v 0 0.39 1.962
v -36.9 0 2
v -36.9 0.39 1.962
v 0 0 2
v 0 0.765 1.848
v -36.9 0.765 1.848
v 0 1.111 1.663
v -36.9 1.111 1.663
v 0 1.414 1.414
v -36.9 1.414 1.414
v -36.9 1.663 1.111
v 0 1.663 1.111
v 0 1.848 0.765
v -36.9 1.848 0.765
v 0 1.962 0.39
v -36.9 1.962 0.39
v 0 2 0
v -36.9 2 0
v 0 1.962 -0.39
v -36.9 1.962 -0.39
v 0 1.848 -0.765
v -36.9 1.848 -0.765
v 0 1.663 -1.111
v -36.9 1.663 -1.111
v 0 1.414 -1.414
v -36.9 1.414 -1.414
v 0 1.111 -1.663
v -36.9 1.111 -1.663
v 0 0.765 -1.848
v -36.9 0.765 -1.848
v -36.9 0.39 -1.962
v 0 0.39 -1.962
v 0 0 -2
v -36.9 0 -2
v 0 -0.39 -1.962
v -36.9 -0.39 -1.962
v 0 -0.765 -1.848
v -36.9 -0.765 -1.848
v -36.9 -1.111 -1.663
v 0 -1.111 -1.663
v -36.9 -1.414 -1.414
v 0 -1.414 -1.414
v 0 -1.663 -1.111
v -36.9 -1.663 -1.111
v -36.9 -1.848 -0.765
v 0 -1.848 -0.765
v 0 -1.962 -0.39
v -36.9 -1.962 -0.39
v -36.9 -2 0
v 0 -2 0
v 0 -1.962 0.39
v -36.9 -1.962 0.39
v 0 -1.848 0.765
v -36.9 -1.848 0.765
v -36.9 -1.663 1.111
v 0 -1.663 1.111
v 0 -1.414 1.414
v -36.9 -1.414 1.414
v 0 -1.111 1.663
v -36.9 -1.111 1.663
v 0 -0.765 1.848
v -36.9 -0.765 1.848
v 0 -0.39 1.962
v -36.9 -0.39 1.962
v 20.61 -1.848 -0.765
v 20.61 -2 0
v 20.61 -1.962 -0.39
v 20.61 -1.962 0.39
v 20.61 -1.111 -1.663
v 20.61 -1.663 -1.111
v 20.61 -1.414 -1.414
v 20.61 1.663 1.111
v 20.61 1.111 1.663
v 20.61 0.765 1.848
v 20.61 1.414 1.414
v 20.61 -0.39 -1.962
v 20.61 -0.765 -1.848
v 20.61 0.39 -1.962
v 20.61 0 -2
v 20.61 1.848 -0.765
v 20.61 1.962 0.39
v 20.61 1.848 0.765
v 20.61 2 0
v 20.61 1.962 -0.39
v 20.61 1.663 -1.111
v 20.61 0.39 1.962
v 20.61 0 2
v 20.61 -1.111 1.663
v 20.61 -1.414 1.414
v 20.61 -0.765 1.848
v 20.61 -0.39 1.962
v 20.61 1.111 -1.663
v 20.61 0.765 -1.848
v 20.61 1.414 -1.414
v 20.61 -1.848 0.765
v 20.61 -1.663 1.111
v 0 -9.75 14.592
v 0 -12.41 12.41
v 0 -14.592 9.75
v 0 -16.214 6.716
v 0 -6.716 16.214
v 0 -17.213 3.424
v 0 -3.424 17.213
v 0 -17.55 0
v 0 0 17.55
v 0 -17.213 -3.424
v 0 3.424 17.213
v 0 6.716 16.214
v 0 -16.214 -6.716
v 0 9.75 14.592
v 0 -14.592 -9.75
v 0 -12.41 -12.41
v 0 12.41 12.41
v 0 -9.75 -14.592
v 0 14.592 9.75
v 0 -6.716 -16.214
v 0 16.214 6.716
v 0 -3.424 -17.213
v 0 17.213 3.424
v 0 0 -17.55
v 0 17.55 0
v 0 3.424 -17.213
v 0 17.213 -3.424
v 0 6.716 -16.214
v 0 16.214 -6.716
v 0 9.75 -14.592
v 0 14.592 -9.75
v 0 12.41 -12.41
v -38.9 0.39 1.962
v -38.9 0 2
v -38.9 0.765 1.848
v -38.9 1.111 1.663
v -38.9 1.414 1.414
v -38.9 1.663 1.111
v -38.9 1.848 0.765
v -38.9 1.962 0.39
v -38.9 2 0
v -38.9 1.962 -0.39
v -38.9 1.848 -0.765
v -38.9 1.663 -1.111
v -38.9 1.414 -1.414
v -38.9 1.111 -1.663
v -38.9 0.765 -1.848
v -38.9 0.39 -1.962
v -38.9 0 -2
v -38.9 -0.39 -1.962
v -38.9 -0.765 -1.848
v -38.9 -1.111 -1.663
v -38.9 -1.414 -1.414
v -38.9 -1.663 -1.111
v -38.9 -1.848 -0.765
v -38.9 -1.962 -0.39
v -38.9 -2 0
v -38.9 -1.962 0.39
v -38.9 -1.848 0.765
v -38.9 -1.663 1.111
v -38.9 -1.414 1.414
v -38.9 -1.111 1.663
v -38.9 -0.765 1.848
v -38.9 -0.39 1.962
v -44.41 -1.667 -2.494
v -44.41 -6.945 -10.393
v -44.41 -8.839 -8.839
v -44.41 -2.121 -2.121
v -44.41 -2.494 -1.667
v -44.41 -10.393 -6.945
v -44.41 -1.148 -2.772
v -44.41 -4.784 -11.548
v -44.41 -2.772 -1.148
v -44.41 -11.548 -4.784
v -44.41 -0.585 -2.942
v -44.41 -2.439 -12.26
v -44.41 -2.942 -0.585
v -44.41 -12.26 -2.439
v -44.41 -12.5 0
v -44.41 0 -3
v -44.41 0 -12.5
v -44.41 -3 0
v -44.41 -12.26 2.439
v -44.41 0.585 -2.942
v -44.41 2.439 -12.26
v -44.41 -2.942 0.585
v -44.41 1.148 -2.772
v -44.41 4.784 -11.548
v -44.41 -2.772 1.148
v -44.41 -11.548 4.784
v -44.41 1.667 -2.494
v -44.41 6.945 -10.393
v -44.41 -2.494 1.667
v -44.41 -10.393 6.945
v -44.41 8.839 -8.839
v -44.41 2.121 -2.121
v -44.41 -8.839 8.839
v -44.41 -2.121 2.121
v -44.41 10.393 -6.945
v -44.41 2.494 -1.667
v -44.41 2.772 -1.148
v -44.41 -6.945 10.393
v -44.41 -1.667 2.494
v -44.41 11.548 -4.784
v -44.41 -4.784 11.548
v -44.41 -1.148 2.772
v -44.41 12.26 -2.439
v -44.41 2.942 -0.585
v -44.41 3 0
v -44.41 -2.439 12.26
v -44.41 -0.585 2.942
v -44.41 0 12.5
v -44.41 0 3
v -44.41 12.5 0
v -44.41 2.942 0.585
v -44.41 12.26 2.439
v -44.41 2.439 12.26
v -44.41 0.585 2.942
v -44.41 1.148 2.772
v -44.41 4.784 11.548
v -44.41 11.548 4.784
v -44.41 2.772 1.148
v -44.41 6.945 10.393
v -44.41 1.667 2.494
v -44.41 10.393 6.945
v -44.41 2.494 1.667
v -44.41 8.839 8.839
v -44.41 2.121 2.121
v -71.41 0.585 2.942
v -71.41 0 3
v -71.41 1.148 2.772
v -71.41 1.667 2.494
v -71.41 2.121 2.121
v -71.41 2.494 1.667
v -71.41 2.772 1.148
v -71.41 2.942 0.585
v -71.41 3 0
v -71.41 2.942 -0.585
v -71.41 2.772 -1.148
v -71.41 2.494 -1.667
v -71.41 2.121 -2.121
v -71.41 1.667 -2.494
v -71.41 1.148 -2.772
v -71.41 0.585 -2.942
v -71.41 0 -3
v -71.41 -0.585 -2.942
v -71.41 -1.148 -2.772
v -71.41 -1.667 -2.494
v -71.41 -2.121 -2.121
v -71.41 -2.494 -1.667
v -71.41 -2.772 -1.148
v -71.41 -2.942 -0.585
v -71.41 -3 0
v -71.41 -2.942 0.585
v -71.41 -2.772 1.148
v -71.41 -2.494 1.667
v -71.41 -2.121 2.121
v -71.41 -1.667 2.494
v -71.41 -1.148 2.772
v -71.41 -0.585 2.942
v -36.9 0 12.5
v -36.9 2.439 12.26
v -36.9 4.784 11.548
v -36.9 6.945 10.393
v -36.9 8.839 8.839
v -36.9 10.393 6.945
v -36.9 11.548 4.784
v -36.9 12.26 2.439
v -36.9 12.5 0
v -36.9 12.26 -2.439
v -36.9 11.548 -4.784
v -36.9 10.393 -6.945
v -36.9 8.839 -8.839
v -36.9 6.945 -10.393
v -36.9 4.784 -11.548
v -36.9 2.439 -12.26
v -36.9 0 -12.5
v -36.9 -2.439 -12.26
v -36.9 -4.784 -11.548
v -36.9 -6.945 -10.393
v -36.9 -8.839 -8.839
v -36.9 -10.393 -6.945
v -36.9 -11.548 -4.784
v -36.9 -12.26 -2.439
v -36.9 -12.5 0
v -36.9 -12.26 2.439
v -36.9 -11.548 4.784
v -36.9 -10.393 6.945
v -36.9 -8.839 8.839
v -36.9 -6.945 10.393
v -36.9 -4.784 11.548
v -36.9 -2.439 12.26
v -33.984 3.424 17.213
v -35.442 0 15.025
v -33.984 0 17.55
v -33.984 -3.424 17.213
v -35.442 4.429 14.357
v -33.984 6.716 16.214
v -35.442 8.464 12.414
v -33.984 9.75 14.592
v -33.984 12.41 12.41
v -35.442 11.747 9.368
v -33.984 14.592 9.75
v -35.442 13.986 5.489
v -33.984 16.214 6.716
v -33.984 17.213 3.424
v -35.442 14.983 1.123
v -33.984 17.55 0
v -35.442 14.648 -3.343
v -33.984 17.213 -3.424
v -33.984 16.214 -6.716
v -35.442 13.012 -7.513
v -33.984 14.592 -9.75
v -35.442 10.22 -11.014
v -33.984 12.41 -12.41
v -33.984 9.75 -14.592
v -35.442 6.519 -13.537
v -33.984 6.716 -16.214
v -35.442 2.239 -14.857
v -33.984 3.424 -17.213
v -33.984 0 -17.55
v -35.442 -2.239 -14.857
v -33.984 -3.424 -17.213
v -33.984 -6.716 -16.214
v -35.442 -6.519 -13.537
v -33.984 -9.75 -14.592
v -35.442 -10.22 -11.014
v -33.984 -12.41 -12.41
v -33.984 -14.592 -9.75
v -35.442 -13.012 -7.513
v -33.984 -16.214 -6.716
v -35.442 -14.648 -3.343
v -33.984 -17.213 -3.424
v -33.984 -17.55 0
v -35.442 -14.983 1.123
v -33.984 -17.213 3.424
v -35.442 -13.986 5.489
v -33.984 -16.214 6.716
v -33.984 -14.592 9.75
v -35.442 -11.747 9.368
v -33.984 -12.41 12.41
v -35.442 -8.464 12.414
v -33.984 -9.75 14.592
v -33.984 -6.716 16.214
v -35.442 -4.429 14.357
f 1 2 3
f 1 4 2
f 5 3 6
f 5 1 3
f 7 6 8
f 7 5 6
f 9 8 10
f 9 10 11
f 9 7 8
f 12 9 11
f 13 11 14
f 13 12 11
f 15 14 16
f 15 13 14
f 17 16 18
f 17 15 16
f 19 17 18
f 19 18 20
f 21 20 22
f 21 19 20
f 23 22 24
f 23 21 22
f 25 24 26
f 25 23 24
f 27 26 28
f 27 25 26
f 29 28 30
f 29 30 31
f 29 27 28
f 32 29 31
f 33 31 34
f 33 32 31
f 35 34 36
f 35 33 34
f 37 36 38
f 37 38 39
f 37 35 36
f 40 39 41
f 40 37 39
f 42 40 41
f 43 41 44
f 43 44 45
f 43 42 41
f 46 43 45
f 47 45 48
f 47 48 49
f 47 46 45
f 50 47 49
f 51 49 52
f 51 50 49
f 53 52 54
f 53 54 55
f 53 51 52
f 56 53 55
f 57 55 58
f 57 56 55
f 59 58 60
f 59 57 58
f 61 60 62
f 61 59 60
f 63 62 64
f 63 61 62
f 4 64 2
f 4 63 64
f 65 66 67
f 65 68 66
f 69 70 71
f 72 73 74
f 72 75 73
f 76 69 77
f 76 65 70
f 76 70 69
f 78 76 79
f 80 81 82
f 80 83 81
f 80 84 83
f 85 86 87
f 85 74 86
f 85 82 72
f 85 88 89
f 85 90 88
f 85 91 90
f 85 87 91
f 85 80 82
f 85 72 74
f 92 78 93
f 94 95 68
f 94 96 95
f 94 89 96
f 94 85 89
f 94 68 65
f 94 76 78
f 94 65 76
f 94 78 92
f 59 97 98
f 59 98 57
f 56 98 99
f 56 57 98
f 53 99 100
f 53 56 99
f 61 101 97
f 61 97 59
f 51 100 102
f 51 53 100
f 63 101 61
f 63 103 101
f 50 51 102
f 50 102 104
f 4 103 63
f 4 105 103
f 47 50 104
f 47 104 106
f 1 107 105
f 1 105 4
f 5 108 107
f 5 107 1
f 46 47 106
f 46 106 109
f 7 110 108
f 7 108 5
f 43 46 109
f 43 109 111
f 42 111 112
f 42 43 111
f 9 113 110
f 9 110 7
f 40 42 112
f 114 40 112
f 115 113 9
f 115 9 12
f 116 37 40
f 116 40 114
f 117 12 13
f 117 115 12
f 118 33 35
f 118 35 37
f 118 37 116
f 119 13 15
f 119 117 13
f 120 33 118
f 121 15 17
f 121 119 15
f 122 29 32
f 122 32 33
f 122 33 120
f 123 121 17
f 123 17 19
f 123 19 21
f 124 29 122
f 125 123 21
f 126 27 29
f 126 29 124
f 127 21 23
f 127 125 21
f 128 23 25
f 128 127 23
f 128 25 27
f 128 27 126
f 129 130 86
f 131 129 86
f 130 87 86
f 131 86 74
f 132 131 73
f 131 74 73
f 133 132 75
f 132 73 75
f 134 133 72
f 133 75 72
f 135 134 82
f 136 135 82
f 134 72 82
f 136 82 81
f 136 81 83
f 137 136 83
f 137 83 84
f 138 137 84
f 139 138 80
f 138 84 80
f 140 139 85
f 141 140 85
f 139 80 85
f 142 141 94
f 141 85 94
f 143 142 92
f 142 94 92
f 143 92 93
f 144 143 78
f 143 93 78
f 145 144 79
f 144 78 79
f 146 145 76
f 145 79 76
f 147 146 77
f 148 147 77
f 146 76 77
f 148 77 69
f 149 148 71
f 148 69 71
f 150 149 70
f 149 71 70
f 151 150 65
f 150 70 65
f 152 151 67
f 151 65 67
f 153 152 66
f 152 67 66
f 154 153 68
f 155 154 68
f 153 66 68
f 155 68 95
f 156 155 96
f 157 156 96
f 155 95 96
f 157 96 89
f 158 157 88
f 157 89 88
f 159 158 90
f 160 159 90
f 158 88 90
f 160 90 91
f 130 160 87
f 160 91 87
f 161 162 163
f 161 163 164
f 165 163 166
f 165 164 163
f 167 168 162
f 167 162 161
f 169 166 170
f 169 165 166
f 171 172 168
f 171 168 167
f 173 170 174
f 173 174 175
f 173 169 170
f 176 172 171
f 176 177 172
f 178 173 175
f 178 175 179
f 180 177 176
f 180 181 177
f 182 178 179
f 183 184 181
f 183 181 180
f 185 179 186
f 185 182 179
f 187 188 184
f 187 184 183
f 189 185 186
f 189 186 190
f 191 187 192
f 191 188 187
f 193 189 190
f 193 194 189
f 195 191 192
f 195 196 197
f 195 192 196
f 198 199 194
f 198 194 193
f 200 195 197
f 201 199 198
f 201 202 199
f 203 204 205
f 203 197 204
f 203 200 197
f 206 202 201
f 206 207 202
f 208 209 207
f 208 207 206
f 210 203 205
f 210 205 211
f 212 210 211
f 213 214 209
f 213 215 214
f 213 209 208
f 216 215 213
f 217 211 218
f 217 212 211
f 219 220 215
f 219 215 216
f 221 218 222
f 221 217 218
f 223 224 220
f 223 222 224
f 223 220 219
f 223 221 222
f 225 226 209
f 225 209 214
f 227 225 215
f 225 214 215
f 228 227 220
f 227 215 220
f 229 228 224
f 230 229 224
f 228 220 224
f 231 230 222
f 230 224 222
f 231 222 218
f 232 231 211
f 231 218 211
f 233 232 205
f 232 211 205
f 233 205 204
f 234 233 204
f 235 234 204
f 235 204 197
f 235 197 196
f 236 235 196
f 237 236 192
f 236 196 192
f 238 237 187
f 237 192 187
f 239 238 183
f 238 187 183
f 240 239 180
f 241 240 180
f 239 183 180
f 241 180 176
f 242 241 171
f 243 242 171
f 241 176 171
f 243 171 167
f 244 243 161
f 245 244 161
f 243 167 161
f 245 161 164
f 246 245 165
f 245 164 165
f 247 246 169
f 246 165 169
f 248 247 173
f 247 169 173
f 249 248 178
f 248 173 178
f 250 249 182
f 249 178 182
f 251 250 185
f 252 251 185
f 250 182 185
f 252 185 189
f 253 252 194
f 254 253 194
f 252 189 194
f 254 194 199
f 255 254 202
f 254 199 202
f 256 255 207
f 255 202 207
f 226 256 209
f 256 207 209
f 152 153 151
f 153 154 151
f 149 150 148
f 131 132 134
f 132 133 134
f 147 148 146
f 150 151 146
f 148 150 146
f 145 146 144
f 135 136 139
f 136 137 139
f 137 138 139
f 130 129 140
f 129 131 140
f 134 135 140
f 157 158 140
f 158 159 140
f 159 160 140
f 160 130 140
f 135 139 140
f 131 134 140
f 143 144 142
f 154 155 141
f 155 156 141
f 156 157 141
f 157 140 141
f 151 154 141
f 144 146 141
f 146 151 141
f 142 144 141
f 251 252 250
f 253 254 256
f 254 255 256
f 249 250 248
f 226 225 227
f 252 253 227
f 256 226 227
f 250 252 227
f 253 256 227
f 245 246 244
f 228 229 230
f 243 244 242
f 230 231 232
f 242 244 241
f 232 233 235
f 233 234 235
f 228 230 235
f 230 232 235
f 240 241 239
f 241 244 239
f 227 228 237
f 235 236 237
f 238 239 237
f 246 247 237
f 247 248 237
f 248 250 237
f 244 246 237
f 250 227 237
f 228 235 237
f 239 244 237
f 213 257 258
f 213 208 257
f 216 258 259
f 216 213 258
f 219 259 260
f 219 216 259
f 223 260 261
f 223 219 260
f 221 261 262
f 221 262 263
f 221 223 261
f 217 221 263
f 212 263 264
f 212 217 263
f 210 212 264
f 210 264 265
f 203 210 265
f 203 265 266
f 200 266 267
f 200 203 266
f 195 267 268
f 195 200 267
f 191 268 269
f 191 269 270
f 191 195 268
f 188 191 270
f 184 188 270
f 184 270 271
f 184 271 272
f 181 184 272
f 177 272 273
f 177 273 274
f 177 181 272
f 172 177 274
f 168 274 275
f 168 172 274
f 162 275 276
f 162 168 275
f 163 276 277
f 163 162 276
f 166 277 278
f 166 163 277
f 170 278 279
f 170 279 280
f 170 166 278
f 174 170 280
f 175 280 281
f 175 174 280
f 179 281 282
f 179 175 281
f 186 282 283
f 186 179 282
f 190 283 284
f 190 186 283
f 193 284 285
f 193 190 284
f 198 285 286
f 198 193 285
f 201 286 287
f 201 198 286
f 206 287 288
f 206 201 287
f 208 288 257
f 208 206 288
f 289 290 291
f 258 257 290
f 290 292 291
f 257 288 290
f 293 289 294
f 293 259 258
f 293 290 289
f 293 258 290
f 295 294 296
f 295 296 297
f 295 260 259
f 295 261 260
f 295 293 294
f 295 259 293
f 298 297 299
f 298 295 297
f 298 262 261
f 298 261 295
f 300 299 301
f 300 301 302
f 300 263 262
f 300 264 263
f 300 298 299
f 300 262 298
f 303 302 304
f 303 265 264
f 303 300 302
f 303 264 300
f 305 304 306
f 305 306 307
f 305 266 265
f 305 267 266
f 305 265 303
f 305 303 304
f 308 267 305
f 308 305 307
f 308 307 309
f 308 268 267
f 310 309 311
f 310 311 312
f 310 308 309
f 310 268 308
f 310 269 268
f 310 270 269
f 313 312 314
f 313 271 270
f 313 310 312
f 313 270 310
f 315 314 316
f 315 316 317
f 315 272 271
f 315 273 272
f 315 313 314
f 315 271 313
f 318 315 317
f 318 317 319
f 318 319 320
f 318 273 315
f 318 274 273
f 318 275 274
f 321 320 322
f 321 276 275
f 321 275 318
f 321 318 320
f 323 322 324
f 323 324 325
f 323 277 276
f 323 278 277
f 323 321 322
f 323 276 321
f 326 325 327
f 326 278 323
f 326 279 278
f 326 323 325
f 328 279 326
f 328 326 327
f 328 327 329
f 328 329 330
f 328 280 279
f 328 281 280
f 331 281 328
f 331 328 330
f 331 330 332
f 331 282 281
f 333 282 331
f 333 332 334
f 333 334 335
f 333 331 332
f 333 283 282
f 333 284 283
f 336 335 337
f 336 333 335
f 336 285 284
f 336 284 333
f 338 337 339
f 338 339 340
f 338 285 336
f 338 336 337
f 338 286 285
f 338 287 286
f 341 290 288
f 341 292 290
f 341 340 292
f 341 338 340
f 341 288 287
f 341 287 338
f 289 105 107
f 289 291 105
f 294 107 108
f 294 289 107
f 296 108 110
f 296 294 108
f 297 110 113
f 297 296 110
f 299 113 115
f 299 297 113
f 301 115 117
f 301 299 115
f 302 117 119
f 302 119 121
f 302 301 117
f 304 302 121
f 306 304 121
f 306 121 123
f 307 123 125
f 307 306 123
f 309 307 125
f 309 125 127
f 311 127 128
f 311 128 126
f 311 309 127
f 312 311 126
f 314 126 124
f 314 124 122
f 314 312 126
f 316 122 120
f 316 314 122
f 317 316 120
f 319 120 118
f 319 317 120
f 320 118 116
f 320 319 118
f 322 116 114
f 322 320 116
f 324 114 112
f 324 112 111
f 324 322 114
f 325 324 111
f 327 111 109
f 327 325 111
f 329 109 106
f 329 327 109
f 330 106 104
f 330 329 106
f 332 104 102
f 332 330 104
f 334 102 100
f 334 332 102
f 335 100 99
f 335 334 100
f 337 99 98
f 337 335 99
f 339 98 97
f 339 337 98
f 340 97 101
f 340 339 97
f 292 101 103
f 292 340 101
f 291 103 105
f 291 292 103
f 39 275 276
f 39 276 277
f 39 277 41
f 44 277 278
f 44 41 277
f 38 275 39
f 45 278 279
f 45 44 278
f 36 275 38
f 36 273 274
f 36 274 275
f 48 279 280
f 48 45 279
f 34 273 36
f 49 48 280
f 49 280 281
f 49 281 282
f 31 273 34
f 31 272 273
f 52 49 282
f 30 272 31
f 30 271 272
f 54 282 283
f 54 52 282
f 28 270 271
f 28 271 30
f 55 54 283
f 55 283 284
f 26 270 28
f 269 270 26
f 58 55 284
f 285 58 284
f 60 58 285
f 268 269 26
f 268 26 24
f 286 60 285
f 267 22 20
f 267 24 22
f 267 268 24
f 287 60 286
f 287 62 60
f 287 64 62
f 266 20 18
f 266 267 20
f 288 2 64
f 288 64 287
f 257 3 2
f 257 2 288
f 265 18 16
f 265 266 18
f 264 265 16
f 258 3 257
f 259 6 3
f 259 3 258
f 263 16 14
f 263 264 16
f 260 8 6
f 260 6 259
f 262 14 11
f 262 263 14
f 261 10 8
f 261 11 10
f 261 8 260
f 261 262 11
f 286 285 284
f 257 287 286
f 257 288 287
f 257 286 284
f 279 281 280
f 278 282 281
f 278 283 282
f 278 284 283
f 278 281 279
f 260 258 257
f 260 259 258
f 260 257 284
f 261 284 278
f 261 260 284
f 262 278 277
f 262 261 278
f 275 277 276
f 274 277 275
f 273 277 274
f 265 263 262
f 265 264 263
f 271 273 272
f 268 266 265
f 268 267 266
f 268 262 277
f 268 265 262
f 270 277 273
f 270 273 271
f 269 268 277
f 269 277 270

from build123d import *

# Parameters (mm, degrees)
F1_W = 20.61
F1_H = 2
F2_W = 59.51
F2_H = 2
F3_W = 27
F3_H = 3


with BuildPart() as f4:
    # F1 (on Front) → F4 (revolve)
    with BuildSketch(Plane.XZ):
        with Locations((10.305, 1)):
            Rectangle(F1_W, F1_H)
    revolve(axis=Axis((-25.4, 0, 0), (-1, 0, 0)))

    # F2 (on Front) → F5 (revolve)
    with BuildSketch(Plane.XZ):
        with Locations((-9.145, 1)):
            Rectangle(F2_W, F2_H)
    revolve(axis=Axis((-25.4, 0, 0), (-1, 0, 0)))


with BuildPart() as f4b:
    # F1 (on Front) → F4, piece 2 (revolve)
    with BuildSketch(Plane.XZ):
        Polygon((0, 17.55), (-33.9843811406, 17.55), (-36.9, 12.5), (-36.9, 2), (0, 2), align=None)
    revolve(axis=Axis((-25.4, 0, 0), (-1, 0, 0)))


with BuildPart() as f6:
    # F3 (on Front) → F6 (revolve)
    with BuildSketch(Plane.XZ):
        with Locations((-57.91, 1.5)):
            Rectangle(F3_W, F3_H)
        Polygon((-36.9, 12.5), (-44.41, 12.5), (-44.41, 3), (-44.41, 0), (-36.9, 0), align=None)
    revolve(axis=Axis((-25.4, 0, 0), (-1, 0, 0)))


solid = Compound([f4.part, f4b.part, f6.part])
